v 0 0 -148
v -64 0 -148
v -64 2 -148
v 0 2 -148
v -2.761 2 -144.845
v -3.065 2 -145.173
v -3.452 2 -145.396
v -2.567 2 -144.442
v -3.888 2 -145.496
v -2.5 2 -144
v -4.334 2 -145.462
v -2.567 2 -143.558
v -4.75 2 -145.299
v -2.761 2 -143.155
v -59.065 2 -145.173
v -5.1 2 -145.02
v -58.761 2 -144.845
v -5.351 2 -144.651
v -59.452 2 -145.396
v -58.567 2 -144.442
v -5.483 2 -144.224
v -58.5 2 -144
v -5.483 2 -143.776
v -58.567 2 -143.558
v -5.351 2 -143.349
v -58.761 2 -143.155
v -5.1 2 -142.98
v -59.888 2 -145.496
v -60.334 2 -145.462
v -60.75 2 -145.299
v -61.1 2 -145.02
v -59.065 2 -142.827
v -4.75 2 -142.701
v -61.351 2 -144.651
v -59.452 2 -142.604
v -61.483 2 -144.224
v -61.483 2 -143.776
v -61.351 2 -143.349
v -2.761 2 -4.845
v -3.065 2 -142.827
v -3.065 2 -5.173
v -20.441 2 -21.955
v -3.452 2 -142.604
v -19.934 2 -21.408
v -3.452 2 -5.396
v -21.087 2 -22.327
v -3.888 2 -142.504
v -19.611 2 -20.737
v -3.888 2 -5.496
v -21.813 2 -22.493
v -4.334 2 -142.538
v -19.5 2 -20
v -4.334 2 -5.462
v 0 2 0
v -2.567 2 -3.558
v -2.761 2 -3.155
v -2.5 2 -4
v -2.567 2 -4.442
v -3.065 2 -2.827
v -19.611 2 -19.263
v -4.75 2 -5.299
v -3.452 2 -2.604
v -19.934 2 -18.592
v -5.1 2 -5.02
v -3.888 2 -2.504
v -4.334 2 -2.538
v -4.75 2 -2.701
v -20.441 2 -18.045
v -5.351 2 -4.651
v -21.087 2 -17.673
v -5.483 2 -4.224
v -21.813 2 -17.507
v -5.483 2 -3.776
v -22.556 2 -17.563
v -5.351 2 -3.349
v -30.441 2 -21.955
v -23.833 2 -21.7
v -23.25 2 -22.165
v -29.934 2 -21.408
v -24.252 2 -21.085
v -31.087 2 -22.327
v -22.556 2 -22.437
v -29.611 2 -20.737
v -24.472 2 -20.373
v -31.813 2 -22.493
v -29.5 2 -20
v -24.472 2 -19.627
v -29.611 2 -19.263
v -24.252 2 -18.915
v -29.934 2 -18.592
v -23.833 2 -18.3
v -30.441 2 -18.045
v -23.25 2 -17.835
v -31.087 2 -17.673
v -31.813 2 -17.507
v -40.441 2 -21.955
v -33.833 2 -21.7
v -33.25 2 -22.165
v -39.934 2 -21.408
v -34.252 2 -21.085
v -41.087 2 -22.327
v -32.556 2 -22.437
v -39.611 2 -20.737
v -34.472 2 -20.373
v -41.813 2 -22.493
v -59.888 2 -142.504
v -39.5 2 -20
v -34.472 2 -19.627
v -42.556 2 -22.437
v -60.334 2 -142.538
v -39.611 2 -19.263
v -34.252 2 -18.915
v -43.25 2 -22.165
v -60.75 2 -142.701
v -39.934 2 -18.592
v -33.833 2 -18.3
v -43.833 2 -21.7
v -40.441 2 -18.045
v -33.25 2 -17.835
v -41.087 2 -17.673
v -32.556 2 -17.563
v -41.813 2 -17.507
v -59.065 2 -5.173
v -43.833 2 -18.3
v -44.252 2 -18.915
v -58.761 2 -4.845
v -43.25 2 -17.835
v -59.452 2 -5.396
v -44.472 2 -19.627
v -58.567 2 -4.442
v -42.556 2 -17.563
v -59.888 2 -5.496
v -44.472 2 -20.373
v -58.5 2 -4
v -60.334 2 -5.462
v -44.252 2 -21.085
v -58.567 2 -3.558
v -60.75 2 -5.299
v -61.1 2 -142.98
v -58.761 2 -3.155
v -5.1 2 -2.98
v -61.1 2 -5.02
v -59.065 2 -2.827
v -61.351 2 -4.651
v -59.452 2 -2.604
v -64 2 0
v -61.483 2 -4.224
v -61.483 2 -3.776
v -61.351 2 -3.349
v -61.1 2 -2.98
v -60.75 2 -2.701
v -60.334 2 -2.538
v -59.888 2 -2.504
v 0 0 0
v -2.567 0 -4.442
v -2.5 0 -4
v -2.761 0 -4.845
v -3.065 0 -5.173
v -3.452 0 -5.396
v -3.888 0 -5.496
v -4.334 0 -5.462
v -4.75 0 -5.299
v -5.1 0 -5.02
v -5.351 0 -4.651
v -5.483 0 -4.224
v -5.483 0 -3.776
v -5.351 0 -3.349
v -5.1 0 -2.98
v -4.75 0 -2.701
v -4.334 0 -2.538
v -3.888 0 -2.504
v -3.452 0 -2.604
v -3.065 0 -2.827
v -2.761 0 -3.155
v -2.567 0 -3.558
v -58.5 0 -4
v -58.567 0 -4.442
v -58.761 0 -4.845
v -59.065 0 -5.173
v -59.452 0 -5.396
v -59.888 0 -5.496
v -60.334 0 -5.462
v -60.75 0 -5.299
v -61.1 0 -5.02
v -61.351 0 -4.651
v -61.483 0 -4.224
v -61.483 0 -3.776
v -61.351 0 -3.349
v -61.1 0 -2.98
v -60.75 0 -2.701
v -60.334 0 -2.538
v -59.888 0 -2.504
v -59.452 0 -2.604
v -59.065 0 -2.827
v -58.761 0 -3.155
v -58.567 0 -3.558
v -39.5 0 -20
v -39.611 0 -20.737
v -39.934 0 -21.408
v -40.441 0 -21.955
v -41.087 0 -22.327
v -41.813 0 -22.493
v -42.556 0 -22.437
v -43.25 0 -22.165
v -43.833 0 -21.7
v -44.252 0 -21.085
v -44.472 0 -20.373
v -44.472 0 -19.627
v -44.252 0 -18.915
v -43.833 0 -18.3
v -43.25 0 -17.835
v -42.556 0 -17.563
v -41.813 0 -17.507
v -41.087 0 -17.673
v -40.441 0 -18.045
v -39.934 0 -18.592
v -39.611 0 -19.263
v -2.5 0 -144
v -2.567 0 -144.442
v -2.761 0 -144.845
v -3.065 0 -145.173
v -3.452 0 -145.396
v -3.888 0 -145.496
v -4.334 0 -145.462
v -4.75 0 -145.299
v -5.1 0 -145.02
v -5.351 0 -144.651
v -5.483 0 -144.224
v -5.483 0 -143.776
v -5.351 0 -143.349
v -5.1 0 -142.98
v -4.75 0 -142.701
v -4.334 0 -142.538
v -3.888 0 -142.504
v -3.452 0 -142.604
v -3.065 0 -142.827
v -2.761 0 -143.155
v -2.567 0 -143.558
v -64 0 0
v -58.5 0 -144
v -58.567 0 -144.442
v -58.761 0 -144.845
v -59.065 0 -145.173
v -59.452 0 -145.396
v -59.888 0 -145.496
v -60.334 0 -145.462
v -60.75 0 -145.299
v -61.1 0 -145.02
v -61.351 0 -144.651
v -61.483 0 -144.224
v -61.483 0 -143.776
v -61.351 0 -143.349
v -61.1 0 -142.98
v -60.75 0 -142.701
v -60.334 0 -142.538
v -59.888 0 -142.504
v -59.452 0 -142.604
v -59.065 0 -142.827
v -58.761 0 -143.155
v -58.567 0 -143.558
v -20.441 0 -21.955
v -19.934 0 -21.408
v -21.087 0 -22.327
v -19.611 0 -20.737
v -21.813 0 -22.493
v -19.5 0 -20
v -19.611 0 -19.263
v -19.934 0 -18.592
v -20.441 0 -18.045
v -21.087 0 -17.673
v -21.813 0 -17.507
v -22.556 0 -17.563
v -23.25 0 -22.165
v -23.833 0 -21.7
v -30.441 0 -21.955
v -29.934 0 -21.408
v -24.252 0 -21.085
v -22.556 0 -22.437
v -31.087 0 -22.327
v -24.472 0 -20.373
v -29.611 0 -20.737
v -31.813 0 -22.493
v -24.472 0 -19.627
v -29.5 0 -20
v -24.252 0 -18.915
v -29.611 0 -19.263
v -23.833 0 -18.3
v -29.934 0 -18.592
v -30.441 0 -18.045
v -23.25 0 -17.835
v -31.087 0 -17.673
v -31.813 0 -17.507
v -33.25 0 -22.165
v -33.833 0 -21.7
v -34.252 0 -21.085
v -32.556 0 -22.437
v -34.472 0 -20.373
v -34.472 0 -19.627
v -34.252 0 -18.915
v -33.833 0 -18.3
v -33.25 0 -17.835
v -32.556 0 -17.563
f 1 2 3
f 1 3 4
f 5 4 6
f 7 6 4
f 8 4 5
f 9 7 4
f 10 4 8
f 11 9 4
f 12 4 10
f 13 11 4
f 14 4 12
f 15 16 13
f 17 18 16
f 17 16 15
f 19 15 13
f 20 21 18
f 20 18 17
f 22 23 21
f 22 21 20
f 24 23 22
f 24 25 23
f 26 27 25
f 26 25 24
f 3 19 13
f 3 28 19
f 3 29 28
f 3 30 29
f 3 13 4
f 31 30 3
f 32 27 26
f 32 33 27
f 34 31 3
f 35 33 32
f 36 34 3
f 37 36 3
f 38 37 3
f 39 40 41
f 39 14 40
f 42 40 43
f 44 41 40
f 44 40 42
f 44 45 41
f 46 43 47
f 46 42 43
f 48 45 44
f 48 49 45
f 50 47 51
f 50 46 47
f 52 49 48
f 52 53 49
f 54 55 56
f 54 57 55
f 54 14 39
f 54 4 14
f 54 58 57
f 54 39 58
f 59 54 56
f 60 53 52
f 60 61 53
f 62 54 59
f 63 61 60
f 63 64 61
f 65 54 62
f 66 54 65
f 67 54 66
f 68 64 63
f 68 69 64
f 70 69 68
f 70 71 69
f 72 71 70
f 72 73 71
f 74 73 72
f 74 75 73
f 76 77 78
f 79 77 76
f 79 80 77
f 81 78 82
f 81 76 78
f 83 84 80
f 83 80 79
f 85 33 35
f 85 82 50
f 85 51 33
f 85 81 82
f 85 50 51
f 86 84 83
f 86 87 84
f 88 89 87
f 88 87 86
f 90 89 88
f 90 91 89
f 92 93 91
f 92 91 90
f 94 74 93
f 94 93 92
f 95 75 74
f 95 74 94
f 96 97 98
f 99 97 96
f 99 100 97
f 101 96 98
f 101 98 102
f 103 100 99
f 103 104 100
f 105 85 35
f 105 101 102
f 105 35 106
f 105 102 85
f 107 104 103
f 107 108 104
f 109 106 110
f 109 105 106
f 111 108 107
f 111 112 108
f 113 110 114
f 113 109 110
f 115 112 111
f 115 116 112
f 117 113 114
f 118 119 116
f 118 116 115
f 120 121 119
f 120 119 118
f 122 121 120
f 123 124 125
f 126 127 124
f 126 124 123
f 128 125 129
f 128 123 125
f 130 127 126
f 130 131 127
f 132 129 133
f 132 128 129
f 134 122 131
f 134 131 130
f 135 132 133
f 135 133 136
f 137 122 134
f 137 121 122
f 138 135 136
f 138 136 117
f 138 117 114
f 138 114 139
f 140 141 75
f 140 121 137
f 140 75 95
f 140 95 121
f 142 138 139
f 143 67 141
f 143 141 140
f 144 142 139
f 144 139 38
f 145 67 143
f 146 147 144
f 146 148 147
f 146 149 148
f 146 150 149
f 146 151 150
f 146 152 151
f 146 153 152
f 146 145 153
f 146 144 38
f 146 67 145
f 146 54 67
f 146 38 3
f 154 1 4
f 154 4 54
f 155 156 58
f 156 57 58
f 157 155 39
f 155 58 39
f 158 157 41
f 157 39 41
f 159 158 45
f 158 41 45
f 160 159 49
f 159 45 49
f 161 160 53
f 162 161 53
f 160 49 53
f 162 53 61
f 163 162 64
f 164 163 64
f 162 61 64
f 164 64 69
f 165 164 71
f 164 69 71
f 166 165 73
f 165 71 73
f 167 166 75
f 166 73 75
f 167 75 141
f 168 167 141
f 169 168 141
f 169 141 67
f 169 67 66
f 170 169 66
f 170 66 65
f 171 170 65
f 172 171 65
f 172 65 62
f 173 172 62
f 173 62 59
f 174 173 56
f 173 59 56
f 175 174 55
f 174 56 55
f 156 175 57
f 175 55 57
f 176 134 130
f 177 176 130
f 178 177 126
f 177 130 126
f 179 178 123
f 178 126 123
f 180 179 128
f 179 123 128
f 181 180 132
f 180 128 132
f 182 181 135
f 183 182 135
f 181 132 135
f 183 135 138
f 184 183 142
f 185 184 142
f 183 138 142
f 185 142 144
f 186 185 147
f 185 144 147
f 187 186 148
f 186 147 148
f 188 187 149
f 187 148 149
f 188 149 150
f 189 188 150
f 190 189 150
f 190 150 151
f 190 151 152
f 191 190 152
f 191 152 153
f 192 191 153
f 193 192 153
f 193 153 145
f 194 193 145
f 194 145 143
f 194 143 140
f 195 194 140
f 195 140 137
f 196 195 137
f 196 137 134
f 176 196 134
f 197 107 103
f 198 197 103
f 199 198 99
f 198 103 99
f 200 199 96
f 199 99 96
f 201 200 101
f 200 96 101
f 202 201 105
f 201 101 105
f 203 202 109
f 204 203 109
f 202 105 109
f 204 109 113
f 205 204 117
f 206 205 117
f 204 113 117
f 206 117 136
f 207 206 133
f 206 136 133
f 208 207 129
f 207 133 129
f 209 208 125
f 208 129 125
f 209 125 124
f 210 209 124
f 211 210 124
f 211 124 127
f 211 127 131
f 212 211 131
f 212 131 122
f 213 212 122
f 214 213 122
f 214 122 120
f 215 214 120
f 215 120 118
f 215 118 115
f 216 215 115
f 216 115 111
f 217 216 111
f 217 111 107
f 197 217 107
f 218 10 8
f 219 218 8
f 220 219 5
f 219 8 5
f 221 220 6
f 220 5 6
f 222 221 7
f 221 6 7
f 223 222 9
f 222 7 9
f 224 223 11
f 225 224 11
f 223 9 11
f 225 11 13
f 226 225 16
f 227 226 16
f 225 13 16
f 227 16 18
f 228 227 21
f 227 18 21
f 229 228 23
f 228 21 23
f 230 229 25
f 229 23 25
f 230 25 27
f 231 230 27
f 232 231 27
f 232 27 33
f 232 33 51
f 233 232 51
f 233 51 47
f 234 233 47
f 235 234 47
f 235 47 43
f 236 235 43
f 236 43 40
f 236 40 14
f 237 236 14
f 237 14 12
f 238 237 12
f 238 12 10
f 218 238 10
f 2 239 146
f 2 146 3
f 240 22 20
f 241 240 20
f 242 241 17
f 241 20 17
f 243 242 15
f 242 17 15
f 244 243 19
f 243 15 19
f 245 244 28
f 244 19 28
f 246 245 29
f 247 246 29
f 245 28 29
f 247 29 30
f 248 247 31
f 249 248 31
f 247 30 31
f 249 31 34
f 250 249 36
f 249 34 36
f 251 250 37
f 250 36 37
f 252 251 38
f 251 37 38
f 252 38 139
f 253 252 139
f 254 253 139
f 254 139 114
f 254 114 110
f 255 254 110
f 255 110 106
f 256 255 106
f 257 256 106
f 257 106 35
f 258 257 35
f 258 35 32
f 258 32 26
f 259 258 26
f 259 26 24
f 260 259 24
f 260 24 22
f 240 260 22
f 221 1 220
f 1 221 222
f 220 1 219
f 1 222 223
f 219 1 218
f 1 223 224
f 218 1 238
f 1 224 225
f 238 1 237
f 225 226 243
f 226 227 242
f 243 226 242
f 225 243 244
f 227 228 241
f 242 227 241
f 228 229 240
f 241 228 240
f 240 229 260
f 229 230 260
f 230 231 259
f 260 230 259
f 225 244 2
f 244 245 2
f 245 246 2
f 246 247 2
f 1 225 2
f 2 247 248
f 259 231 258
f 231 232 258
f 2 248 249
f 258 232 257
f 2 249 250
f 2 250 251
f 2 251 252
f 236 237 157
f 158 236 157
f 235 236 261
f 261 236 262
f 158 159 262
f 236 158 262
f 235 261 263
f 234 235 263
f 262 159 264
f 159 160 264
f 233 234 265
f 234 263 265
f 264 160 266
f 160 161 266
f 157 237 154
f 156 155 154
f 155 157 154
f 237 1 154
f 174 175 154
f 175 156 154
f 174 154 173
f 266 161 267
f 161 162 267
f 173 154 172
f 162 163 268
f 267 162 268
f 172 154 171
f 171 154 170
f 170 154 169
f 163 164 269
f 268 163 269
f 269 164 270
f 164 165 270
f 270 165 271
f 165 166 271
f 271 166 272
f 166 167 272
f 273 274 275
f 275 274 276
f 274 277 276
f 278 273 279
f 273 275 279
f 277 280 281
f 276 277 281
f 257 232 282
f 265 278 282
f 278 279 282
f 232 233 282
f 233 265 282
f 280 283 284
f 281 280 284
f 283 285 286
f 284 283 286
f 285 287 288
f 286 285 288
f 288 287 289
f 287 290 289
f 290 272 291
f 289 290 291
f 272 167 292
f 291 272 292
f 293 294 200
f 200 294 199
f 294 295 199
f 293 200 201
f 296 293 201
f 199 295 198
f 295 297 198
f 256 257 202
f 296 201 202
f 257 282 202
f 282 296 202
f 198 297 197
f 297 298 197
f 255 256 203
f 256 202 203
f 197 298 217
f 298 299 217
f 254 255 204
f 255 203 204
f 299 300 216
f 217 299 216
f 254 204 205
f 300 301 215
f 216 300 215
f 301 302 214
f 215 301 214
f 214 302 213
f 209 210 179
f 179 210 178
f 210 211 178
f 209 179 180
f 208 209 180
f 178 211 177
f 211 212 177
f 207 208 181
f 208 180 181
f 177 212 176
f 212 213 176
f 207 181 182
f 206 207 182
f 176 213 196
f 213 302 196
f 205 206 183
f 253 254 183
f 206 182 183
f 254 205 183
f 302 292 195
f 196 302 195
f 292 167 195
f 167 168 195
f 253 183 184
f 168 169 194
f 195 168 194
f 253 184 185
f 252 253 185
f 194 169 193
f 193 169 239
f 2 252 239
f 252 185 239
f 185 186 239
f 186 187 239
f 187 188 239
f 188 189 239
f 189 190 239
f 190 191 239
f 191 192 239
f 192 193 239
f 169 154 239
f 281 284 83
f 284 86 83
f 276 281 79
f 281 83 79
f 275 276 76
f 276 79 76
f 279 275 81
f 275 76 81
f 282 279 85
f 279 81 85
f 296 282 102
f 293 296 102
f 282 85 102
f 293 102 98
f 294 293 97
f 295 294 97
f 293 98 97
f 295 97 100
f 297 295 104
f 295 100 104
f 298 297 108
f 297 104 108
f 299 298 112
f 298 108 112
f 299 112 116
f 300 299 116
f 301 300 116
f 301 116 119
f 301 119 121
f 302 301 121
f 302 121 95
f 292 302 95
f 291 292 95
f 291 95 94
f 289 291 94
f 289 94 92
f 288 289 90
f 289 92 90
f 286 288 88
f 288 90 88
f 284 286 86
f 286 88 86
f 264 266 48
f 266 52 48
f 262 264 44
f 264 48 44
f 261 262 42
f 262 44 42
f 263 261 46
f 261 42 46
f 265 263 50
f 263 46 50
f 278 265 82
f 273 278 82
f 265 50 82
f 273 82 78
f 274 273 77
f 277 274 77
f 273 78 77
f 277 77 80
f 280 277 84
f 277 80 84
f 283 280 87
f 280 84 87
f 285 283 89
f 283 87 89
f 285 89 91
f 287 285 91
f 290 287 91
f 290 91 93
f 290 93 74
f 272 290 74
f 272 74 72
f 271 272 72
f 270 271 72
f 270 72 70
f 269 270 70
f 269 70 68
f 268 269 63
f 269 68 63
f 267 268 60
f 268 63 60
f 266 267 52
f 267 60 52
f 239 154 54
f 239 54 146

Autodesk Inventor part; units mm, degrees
ref_plane "YZ Plane" through (0, 0, 0) normal (1, 0, 0) x (0, 1, 0)
ref_plane "XZ Plane" through (0, 0, 0) normal (0, 1, 0) x (-1, 0, 0)
ref_plane "XY Plane" through (0, 0, 0) normal (0, 0, 1) x (1, 0, 0)
sketch "Sketch2" plane through (0, 0, 0) normal (0, 1, 0) x (-1, 0, 0)
  line L0 (0, 0) -> (64, 0)
  line L1 (64, 0) -> (64, -148)
  line L2 (64, -148) -> (0, -148)
  line L3 (0, -148) -> (0, 0)
  dimension "d0" = 64
  dimension "d1" = 148
extrude "Extrusion1" add sketch "Sketch2" along normal blind 2
sketch "Sketch3" plane through (0, 2, 0) normal (0, 1, 0) x (1, 0, 0)
  circle A0 centre (-4, 4) radius 1.5
  circle A1 centre (-60, 4) radius 1.5
  circle A2 centre (-60, 144) radius 1.5
  circle A3 centre (-4, 144) radius 1.5
  line L0 (0, 0) -> (0, 148) projected
  line L1 (-64, 0) -> (0, 0) projected
  line L2 (-64, 148) -> (-64, 0) projected
  line L3 (0, 148) -> (-64, 148) projected
  point P0 (0, 0.5)
  point P1 (0, 147.5)
  point P2 (-63.5, 0)
  point P3 (-0.5, 0)
  point P4 (-64, 147.5)
  point P5 (-64, 0.5)
  point P6 (-0.5, 148)
  point P7 (-63.5, 148)
  dimension "d10" = 3
  dimension "d11" = 3
  dimension "d12" = 3
  dimension "d13" = 3
  dimension "d14" = 4
  dimension "d15" = 4
  dimension "d16" = 4
  dimension "d17" = 4
  dimension "d18" = 4
  dimension "d19" = 4
  dimension "d20" = 4
  dimension "d21" = 4
extrude "Extrusion2" cut sketch "Sketch3" against normal blind 2 contours A0 | A1 | A2 | A3
sketch "Sketch4" plane through (0, 2, 0) normal (0, 1, 0) x (1, 0, 0)
  circle A0 centre (-22, 20) radius 2.5
  circle A1 centre (-32, 20) radius 2.5
  circle A2 centre (-42, 20) radius 2.5
  line L0 (0, 0) -> (0, 148) projected
  line L1 (-64, 0) -> (0, 0) projected
  point P0 (0, 0.5)
  point P1 (0, 147.5)
  point P2 (-63.5, 0)
  point P3 (-0.5, 0)
  point P4 (-32, 0)
  dimension "d24" = 5
  dimension "d25" = 5
  dimension "d26" = 5
  dimension "d28" = 32
  dimension "d29" = 10
  dimension "d30" = 10
  dimension "d31" = 20
extrude "Extrusion3" cut sketch "Sketch4" against normal blind 2
properties part number "kotelo_kansi"
